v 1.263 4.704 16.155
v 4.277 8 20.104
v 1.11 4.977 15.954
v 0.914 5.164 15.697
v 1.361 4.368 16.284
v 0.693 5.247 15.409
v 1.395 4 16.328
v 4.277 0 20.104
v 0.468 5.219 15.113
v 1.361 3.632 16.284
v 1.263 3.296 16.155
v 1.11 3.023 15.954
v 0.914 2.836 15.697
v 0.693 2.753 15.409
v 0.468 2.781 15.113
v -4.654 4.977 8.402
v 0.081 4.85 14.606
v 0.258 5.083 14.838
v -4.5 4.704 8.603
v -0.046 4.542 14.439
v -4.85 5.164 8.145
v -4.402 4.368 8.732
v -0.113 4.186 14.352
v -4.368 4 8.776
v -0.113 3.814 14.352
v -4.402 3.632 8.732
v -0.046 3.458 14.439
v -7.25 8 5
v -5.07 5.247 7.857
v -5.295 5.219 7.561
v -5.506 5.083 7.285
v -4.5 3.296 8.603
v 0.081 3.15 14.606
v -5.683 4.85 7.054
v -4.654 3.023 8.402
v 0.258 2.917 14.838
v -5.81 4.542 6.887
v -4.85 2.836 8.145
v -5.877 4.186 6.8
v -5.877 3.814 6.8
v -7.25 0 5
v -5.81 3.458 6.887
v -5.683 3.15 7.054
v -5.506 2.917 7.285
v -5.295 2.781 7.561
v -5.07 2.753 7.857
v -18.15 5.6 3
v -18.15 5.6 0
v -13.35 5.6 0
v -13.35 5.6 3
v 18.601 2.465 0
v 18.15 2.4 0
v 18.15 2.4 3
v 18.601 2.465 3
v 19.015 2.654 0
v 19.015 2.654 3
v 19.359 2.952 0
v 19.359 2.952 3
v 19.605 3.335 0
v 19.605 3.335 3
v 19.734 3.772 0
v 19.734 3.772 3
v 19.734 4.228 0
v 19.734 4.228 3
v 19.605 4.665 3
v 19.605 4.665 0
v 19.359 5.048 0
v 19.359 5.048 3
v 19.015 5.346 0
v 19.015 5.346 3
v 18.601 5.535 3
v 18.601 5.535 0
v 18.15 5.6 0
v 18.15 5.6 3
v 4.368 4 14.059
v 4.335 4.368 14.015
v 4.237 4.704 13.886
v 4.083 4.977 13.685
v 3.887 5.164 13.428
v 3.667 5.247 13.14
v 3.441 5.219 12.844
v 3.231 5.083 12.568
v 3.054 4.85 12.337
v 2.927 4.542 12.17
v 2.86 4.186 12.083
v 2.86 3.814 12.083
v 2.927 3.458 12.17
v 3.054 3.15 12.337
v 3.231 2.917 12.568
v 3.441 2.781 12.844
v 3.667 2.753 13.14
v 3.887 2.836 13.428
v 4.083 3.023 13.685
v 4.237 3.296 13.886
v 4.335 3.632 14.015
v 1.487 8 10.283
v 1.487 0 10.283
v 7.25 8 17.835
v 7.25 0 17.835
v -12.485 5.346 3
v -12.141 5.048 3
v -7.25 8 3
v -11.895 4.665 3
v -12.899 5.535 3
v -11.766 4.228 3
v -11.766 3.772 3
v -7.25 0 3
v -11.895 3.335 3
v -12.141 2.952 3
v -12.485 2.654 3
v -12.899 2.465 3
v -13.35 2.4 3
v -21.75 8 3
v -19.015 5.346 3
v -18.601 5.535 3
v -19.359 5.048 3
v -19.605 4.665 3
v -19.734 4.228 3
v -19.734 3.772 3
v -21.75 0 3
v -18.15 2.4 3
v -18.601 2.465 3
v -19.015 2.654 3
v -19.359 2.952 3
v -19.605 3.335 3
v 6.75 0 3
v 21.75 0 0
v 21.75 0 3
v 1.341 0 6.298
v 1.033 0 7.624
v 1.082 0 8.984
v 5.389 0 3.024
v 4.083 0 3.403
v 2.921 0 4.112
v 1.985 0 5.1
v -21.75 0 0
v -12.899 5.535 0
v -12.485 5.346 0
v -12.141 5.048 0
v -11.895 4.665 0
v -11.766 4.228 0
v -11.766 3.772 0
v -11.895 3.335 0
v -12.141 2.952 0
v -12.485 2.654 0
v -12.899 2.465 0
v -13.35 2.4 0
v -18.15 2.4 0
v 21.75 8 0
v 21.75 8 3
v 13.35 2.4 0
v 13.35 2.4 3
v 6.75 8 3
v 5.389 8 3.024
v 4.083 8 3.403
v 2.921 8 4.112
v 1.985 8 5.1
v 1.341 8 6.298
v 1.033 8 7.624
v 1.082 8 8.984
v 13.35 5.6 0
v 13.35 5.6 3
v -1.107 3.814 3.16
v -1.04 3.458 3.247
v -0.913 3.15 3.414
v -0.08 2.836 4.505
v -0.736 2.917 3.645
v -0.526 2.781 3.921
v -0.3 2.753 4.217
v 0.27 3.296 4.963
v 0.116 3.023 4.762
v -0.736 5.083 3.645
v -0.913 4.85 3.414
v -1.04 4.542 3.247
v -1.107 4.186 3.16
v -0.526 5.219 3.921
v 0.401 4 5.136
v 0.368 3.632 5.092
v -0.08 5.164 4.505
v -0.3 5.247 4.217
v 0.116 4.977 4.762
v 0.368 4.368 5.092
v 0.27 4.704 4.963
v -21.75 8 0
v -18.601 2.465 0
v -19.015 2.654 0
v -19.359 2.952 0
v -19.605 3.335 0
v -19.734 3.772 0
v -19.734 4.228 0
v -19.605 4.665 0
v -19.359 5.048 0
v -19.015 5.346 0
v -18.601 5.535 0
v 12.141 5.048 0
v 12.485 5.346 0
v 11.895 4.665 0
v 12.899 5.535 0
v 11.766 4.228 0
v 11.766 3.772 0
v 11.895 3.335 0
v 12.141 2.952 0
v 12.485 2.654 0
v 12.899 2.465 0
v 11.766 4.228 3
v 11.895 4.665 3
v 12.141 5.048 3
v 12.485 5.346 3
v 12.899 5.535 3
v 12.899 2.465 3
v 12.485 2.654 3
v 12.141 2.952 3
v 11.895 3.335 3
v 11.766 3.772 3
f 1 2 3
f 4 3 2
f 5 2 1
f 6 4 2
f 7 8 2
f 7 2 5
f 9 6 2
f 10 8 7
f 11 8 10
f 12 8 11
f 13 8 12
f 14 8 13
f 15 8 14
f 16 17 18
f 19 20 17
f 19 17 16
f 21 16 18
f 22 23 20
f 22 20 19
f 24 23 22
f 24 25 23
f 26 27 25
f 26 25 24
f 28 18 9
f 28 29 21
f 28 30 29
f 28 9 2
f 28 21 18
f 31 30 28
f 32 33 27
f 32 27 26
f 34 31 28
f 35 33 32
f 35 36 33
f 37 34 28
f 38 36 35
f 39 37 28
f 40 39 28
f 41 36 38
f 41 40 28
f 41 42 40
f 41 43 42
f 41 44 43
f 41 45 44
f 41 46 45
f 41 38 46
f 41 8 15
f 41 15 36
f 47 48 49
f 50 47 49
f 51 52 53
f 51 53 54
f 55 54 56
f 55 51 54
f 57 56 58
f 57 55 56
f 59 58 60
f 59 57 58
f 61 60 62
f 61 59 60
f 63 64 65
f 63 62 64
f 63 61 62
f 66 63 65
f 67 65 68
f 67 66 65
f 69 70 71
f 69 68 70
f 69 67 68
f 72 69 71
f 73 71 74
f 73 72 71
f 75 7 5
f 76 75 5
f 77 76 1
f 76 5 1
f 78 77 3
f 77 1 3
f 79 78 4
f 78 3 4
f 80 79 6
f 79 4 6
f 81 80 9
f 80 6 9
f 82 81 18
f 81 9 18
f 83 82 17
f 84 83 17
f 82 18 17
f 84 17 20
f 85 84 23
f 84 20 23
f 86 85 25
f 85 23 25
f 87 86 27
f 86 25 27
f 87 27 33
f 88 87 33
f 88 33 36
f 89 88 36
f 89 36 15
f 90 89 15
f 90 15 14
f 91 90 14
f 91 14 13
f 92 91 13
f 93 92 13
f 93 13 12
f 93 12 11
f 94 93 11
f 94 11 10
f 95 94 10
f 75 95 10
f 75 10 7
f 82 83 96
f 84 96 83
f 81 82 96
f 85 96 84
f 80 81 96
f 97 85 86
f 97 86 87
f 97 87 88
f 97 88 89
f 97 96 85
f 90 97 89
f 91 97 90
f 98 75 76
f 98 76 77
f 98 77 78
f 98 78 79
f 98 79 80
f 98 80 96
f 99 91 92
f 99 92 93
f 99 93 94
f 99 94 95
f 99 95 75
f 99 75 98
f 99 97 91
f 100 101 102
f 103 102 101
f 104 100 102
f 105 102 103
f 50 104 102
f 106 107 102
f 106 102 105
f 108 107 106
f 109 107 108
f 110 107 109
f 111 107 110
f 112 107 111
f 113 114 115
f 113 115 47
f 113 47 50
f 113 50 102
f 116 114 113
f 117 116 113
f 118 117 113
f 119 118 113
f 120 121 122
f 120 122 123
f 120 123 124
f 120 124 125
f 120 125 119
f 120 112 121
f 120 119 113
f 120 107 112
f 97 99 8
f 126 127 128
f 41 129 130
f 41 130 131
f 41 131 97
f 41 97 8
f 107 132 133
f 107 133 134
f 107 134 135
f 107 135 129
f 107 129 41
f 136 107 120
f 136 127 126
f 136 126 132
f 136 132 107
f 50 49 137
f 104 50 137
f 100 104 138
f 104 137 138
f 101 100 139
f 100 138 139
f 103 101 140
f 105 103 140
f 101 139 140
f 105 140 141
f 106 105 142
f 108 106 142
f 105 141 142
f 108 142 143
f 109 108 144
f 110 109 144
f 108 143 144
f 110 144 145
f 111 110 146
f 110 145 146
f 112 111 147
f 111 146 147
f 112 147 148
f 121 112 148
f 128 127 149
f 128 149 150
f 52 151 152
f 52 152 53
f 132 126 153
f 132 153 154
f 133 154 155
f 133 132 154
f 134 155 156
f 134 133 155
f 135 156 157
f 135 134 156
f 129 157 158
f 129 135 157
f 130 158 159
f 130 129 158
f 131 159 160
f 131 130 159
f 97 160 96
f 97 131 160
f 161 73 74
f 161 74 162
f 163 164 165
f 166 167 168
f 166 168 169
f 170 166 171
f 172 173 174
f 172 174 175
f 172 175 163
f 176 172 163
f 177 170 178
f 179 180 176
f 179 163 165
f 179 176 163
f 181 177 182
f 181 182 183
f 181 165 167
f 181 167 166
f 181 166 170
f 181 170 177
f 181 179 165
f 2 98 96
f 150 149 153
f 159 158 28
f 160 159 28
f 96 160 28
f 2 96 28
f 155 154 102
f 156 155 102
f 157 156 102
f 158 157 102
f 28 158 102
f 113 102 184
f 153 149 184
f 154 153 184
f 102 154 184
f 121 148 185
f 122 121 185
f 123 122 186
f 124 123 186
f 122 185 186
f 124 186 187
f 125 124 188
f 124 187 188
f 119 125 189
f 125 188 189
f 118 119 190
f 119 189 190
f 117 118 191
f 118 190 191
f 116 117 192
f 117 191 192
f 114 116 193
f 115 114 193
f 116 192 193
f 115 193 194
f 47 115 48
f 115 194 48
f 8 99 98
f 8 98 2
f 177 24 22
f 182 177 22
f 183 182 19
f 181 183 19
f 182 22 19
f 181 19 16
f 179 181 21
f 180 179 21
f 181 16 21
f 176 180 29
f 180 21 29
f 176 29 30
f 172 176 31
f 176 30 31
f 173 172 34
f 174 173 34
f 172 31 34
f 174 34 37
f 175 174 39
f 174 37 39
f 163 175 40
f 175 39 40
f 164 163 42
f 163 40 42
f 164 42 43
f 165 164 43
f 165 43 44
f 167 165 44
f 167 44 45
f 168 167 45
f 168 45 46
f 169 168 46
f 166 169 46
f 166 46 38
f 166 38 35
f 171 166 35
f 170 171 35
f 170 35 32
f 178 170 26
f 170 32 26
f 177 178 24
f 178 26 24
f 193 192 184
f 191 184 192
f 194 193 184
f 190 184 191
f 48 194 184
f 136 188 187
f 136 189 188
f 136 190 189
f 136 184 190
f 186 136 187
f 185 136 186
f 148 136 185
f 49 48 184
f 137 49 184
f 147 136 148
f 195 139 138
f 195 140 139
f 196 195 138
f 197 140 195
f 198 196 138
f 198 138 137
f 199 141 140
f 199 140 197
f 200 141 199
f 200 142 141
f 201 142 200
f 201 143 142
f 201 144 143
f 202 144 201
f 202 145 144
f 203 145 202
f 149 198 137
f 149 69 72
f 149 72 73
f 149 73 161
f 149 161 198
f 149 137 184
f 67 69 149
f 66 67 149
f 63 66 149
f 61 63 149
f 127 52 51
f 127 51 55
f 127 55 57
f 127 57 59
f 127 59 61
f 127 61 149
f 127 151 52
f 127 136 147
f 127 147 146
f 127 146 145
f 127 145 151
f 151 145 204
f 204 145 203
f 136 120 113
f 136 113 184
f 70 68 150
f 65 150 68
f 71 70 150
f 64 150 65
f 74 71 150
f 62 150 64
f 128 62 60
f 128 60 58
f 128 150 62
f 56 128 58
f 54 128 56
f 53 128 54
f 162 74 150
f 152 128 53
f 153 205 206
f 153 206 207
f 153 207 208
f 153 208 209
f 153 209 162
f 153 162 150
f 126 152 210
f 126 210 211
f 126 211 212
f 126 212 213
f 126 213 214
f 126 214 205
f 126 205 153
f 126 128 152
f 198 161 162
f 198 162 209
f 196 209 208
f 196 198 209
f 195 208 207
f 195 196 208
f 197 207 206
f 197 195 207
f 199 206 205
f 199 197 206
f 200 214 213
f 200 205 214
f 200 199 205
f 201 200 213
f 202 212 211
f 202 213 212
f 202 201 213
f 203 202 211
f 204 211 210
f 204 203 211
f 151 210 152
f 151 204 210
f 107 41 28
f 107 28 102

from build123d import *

# Parameters (mm, degrees)
EXTRUDE_1_DEPTH     = 8
CUT_EXTRUDE_1_REACH = 22.104
SKETCH_3_R          = 1.25
CUT_EXTRUDE_2_DEPTH = 6


with BuildPart() as part:
    # Эскиз1 → Бобышка-Вытянуть1 (new body)
    with BuildSketch(Plane(origin=(0, 0, 0), x_dir=(1, 0, 0), z_dir=(0, 1, 0))):
        with BuildLine():
            Line((-21.75, 0), (21.75, 0))
            Line((21.75, 0), (21.75, -3))
            Line((21.75, -3), (6.75, -3))
            ThreePointArc((6.75, -3), (1.985016763, -5.099789535), (1.486609174, -10.283009694))
            Line((1.486609174, -10.283009694), (7.25, -17.835050888))
            Line((7.25, -17.835050888), (4.276781652, -20.104082387))
            Line((4.276781652, -20.104082387), (-7.25, -5))
            Line((-7.25, -5), (-7.25, -3))
            Line((-7.25, -3), (-21.75, -3))
            Line((-21.75, -3), (-21.75, 0))
        make_face()
    extrude(amount=EXTRUDE_1_DEPTH)

    # Эскиз2 → Вырез-Вытянуть1 (cut, up to next)
    with BuildSketch(Plane(origin=(0, 0, 0), x_dir=(-1, 0, 0), z_dir=(0, 0, -1)), mode=Mode.PRIVATE) as cut_extrude_1_sk1:
        with BuildLine():
            Line((-18.15, 5.6), (-13.35, 5.6))
            ThreePointArc((-13.35, 5.6), (-11.75, 4), (-13.35, 2.4))
            Line((-13.35, 2.4), (-18.15, 2.4))
            ThreePointArc((-18.15, 2.4), (-19.75, 4), (-18.15, 5.6))
        make_face()
    cut_extrude_1_tool1 = extrude(cut_extrude_1_sk1.sketch, amount=-CUT_EXTRUDE_1_REACH, mode=Mode.PRIVATE) & part.part
    add(cut_extrude_1_tool1.solids().sort_by_distance((15.75, 4, 0))[0], mode=Mode.SUBTRACT)
    # Эскиз2 → Вырез-Вытянуть1 (cut, up to next)
    with BuildSketch(Plane(origin=(0, 0, 0), x_dir=(-1, 0, 0), z_dir=(0, 0, -1)), mode=Mode.PRIVATE) as cut_extrude_1_sk2:
        with BuildLine():
            Line((18.15, 5.6), (13.35, 5.6))
            ThreePointArc((13.35, 5.6), (11.75, 4), (13.35, 2.4))
            Line((13.35, 2.4), (18.15, 2.4))
            ThreePointArc((18.15, 2.4), (19.75, 4), (18.15, 5.6))
        make_face()
    cut_extrude_1_tool2 = extrude(cut_extrude_1_sk2.sketch, amount=-CUT_EXTRUDE_1_REACH, mode=Mode.PRIVATE) & part.part
    add(cut_extrude_1_tool2.solids().sort_by_distance((-15.75, 4, 0))[0], mode=Mode.SUBTRACT)

    # Эскиз3 → Вырез-Вытянуть2 (cut)
    with BuildSketch(Plane(origin=(-6.9930021, 0, 5.336756397), x_dir=(0.606672719, 0, 0.794951705), z_dir=(-0.794951705, 0, 0.606672719))):
        with Locations((12.576381314, 4)):
            Circle(SKETCH_3_R)
        with Locations((3.076381314, 4)):
            Circle(SKETCH_3_R)
    extrude(amount=-CUT_EXTRUDE_2_DEPTH, mode=Mode.SUBTRACT)


solid = part.part
